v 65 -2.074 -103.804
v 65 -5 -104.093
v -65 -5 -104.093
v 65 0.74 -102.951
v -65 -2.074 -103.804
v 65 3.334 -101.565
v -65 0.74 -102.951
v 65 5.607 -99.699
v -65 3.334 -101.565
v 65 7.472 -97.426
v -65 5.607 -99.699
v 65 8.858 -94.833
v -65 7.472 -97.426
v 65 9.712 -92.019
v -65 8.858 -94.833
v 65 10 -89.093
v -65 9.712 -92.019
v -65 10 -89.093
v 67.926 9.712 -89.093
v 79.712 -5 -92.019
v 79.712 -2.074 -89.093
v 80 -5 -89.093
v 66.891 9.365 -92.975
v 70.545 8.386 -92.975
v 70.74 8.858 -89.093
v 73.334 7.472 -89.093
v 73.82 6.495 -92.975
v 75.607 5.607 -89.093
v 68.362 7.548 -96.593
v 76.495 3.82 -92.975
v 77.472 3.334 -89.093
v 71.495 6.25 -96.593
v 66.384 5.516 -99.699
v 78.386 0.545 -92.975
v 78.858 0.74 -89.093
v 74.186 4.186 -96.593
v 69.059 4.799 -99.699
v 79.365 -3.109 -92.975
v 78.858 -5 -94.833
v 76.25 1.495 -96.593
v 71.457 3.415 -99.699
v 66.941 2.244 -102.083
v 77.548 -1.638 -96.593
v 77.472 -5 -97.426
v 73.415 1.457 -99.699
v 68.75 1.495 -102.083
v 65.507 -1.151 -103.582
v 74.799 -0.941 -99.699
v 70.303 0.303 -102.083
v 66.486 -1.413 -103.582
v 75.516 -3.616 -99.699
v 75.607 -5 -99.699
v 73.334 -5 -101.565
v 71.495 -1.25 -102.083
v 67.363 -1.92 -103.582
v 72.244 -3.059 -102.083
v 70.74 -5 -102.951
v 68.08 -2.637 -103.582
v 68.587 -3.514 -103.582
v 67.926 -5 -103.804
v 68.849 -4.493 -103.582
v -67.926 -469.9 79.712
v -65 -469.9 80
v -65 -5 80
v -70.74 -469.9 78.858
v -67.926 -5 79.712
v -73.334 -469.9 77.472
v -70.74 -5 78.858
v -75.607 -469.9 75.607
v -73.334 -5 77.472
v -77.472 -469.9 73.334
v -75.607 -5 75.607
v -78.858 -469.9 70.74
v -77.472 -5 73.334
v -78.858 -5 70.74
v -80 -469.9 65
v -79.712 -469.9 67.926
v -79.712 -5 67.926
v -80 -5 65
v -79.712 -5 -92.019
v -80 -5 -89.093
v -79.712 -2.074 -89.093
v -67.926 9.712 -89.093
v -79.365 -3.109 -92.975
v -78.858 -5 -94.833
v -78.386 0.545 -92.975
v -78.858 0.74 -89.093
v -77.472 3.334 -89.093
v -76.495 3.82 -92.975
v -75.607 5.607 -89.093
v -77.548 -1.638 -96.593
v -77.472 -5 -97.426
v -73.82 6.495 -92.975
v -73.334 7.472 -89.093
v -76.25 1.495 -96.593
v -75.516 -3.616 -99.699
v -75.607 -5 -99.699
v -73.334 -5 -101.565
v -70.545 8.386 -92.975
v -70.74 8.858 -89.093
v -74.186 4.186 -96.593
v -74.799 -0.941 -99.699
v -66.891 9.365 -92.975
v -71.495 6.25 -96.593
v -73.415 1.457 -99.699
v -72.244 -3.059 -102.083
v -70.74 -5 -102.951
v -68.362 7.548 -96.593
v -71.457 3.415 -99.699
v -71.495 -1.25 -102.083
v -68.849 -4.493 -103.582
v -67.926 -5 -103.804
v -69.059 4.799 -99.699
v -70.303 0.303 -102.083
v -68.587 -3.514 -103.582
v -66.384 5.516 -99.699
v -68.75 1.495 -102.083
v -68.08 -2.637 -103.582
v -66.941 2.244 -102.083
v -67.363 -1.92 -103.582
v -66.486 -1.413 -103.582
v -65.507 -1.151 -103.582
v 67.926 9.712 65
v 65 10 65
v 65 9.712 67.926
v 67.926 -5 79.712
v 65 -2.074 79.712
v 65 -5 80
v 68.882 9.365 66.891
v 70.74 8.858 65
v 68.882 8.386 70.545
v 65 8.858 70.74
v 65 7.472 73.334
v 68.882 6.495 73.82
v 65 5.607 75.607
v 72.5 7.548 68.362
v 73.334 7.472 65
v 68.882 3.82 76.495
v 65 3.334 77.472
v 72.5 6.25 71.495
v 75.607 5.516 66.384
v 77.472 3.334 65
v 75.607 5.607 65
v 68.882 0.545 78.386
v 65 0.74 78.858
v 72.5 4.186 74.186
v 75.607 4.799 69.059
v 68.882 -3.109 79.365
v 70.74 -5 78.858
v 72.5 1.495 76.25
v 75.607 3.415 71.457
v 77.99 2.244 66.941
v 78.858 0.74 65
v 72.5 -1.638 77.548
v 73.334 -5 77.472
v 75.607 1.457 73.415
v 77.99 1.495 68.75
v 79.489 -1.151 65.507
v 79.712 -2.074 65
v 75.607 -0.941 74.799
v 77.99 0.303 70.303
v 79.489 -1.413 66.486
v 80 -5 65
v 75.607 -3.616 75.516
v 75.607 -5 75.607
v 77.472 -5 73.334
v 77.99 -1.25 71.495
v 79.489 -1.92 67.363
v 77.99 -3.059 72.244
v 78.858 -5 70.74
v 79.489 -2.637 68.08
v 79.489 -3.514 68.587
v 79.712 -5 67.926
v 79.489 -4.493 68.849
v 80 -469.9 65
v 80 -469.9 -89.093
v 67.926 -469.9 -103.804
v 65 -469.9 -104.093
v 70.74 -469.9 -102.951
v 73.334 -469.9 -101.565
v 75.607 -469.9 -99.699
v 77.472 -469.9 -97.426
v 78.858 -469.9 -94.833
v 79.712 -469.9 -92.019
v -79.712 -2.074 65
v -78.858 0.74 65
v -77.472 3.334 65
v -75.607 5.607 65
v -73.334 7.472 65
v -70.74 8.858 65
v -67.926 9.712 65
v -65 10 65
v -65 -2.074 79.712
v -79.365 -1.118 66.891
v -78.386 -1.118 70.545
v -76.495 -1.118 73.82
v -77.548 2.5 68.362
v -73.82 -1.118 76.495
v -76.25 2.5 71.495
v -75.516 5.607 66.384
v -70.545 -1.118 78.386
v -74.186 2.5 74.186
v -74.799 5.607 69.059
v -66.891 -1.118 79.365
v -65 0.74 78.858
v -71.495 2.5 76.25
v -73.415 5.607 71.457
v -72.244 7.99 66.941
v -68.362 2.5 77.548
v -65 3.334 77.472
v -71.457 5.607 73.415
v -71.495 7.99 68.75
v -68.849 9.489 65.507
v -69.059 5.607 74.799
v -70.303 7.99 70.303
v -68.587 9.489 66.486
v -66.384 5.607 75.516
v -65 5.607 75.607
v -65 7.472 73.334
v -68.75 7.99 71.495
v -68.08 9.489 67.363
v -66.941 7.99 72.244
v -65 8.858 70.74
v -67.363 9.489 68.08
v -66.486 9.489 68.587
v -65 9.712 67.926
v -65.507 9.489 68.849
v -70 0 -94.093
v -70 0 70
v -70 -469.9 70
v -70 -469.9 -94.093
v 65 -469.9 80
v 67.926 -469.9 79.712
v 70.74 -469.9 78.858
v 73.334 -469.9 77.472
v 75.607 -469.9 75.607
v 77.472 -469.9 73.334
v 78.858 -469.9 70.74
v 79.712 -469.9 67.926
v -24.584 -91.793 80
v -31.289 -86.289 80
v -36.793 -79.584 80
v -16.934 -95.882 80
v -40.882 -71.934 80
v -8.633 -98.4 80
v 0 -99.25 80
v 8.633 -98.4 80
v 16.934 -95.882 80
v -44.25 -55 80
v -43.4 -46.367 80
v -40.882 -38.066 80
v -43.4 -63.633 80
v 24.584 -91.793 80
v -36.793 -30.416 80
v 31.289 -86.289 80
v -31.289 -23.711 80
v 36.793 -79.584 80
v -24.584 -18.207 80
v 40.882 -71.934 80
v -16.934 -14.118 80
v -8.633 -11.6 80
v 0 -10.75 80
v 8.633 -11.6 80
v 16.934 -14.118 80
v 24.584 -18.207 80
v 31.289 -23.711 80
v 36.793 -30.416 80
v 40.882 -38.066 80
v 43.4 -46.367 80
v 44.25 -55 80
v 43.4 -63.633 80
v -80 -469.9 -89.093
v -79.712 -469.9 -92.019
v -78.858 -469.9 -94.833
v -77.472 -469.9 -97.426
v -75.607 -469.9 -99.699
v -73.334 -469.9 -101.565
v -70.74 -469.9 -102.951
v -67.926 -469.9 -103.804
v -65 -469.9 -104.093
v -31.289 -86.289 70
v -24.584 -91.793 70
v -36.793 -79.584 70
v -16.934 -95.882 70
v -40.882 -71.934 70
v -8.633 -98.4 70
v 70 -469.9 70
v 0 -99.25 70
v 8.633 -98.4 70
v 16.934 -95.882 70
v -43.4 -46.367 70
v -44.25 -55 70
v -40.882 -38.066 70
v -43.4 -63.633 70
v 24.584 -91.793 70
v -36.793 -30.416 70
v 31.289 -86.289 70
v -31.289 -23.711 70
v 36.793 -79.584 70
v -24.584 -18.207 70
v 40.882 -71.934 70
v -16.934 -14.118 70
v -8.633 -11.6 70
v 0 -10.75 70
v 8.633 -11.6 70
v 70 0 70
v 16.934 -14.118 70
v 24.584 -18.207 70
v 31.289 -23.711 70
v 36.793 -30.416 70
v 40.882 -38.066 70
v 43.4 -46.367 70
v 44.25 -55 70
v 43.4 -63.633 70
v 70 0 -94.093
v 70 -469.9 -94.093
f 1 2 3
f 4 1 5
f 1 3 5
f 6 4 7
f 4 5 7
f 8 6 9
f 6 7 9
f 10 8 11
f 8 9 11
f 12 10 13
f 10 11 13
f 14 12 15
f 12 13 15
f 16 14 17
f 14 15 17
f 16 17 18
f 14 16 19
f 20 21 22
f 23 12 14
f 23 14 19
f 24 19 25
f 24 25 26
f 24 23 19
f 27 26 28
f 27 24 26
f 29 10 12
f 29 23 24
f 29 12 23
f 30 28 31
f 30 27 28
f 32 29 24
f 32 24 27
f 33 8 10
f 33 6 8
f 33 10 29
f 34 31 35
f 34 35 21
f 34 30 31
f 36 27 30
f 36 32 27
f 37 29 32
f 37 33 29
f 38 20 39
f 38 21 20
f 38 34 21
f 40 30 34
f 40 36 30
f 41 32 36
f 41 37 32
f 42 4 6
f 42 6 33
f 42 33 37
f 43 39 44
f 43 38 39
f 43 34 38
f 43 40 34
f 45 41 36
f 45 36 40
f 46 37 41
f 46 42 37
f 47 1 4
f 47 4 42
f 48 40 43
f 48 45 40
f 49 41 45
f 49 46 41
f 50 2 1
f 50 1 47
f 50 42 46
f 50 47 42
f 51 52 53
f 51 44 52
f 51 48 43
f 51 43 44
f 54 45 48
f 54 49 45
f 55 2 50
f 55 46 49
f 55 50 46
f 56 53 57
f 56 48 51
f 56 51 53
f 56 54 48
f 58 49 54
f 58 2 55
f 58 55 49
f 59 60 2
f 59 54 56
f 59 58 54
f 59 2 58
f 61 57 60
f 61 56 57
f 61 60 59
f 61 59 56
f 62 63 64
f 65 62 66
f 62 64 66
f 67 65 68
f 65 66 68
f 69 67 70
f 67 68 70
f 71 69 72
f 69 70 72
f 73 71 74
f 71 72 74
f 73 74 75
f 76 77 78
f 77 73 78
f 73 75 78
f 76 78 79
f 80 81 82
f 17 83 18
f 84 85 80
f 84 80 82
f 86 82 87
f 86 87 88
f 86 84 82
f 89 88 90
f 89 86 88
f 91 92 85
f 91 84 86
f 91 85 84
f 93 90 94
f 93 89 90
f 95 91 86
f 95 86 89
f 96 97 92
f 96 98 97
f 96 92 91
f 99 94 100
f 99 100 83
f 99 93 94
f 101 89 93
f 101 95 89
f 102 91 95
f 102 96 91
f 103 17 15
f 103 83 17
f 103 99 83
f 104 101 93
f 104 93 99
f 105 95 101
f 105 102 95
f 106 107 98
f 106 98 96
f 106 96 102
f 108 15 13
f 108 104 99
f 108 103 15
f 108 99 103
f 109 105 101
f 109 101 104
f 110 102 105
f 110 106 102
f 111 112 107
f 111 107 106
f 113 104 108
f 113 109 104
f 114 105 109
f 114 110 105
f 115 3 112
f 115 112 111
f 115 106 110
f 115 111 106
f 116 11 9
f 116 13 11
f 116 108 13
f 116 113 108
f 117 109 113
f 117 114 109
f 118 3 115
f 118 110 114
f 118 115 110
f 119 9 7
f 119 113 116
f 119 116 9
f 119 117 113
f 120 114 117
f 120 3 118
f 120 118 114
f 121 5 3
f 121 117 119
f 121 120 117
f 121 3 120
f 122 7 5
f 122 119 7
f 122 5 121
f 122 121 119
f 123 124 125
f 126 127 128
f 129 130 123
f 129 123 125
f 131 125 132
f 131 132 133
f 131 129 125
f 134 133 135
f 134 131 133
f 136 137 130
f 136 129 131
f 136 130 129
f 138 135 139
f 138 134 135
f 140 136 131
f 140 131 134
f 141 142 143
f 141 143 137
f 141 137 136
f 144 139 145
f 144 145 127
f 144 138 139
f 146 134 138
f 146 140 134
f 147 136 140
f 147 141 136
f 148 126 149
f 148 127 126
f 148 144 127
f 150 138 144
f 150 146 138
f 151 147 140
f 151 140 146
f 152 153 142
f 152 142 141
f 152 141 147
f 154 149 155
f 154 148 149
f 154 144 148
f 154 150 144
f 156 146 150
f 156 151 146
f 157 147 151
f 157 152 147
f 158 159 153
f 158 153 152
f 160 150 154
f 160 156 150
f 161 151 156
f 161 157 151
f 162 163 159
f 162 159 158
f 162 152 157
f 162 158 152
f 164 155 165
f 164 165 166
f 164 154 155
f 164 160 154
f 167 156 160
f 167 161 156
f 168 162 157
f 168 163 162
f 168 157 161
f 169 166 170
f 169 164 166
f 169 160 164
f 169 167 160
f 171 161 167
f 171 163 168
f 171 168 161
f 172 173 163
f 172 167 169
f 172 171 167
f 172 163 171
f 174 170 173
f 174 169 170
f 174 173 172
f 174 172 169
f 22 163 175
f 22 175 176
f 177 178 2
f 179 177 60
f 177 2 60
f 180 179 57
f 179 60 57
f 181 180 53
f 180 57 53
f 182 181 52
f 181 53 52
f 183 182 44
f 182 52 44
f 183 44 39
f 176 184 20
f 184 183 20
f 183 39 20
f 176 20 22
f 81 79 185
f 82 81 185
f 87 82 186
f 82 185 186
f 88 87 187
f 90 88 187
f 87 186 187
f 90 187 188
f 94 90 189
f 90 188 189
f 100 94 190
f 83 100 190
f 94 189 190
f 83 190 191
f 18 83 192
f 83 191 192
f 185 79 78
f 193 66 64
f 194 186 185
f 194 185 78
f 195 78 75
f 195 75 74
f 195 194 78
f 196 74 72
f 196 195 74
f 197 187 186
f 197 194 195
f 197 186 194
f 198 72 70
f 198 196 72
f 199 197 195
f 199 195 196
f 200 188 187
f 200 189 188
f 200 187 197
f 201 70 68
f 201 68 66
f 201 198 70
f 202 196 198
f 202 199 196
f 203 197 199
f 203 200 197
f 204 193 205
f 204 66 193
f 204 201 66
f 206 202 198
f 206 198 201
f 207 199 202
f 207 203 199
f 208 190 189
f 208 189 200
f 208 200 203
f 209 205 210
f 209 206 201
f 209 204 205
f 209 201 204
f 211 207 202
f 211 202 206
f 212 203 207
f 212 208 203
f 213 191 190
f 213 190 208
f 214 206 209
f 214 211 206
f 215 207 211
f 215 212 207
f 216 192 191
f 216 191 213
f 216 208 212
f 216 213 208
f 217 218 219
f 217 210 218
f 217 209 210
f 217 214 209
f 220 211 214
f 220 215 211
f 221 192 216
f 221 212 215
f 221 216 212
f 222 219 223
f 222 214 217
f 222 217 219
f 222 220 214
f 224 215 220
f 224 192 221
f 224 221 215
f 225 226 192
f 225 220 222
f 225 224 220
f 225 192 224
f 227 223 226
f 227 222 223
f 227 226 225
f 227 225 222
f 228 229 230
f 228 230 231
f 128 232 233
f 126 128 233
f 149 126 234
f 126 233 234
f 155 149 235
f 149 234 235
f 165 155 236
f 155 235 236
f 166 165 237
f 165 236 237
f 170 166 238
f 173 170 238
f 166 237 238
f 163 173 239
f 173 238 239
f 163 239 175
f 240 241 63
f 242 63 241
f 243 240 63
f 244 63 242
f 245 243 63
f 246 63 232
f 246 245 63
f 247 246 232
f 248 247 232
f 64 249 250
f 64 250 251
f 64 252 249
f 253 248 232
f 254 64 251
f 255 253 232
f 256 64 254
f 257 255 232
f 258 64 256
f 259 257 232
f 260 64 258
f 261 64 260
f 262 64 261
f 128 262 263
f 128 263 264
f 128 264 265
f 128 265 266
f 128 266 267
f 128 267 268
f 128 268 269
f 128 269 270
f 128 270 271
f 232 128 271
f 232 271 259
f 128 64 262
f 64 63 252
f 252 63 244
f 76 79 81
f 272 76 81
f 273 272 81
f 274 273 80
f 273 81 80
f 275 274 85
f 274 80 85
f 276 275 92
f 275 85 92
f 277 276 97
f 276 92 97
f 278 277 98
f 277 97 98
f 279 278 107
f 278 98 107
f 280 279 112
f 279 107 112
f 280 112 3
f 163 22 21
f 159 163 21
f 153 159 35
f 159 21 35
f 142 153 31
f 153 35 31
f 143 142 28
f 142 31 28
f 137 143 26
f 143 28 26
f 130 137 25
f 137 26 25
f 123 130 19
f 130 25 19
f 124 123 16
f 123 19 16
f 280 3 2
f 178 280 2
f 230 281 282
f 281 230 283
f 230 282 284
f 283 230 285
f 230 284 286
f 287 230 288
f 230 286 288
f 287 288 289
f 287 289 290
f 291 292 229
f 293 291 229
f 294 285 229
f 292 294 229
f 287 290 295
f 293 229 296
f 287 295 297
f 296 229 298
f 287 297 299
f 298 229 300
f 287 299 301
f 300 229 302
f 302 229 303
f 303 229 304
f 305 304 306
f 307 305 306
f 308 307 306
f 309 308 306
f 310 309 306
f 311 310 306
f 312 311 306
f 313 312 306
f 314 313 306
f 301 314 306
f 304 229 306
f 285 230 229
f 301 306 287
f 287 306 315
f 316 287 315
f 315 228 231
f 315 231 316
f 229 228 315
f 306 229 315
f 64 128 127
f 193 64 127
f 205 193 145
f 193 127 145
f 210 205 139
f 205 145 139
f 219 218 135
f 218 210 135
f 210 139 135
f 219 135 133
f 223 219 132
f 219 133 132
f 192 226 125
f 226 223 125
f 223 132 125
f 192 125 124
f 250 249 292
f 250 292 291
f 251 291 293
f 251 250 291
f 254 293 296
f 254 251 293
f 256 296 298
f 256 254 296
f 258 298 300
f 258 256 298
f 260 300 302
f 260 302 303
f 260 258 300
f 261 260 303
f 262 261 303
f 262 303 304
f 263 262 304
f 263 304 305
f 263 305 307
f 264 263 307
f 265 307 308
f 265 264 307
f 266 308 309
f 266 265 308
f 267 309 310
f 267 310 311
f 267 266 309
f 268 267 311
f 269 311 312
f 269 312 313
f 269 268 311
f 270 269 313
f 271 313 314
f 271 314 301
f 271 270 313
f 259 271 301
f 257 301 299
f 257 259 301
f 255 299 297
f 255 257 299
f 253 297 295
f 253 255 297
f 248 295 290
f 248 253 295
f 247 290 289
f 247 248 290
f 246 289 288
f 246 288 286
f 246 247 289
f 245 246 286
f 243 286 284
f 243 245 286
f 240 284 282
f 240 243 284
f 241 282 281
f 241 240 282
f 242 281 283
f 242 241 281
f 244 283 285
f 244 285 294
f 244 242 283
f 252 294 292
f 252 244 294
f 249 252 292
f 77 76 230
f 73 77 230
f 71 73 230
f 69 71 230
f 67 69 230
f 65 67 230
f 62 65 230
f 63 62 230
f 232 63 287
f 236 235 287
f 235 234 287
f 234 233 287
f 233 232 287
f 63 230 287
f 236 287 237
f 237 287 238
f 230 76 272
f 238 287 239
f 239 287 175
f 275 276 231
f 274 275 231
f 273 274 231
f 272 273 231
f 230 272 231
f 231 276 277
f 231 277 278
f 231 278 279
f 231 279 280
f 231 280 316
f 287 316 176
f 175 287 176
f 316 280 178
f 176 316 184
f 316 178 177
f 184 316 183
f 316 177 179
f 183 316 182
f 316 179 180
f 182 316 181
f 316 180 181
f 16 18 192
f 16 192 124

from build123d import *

# Parameters (mm, degrees)
SKETCH2_W           = 140
SKETCH2_H           = 164.092615239
BOSS_EXTRUDE1_DEPTH = 469.9
SHELL1_T            = 10
FILLET2_R           = 15
SKETCH4_R           = 44.25
CUT_EXTRUDE2_DEPTH  = 10


with BuildPart() as part:
    # Sketch2 → Boss-Extrude1 (new body)
    with BuildSketch(Plane(origin=(0, 0, 0), x_dir=(1, 0, 0), z_dir=(0, 1, 0))):
        with Locations((0, 12.04630762)):
            Rectangle(SKETCH2_W, SKETCH2_H)
    extrude(amount=-BOSS_EXTRUDE1_DEPTH)

    # Shell1
    shell1_openings = [part.faces().sort_by_distance(p)[0] for p in [
        (0, -469.9, -12.046307619),
    ]]
    offset(amount=SHELL1_T, openings=shell1_openings, kind=Kind.INTERSECTION)

    # Fillet2
    # the kernel refuses this fillet: 15 mm, written as the material it takes off along each edge
    with BuildSketch(Plane(origin=(65, -5, 65), x_dir=(0, 1, 0), z_dir=(1, 0, 0))) as fillet2_piece_1_section:
        Polygon((0, 0), (FILLET2_R, 0), (FILLET2_R, FILLET2_R), (0, FILLET2_R), align=None)
    fillet2_piece_1 = extrude(amount=FILLET2_R, mode=Mode.PRIVATE)
    fillet2_piece_1 = fillet2_piece_1 - Plane(origin=(65, -5, 65), x_dir=(0, -0.7071067811865475, -0.7071067811865475), z_dir=(1, 0, 0)) * Sphere(FILLET2_R, mode=Mode.PRIVATE)
    add(fillet2_piece_1, mode=Mode.SUBTRACT)
    with BuildSketch(Plane(origin=(-65, -5, 65), x_dir=(0, 0, 1), z_dir=(0, 1, 0))) as fillet2_piece_2_section:
        Polygon((0, 0), (FILLET2_R, 0), (FILLET2_R, -FILLET2_R), (0, -FILLET2_R), align=None)
    fillet2_piece_2 = extrude(amount=FILLET2_R, mode=Mode.PRIVATE)
    fillet2_piece_2 = fillet2_piece_2 - Plane(origin=(-65, -5, 65), x_dir=(0.7071067811865475, 0, -0.7071067811865475), z_dir=(0, 1, 0)) * Sphere(FILLET2_R, mode=Mode.PRIVATE)
    add(fillet2_piece_2, mode=Mode.SUBTRACT)
    with BuildSketch(Plane(origin=(-65, -5, -89.092615239), x_dir=(0, 1, 0), z_dir=(0, 0, -1))) as fillet2_piece_3_section:
        Polygon((0, 0), (FILLET2_R, 0), (FILLET2_R, -FILLET2_R), (0, -FILLET2_R), align=None)
    fillet2_piece_3 = extrude(amount=FILLET2_R, mode=Mode.PRIVATE)
    fillet2_piece_3 = fillet2_piece_3 - Plane(origin=(-65, -5, -89.092615239), x_dir=(0.7071067811865475, -0.7071067811865475, 0), z_dir=(0, 0, -1)) * Sphere(FILLET2_R, mode=Mode.PRIVATE)
    add(fillet2_piece_3, mode=Mode.SUBTRACT)
    with BuildSketch(Plane(origin=(65, -5, -89.092615239), x_dir=(1, 0, 0), z_dir=(0, 0, -1))) as fillet2_piece_4_section:
        Polygon((0, 0), (FILLET2_R, 0), (FILLET2_R, -FILLET2_R), (0, -FILLET2_R), align=None)
    fillet2_piece_4 = extrude(amount=FILLET2_R, mode=Mode.PRIVATE)
    fillet2_piece_4 = fillet2_piece_4 - Plane(origin=(65, -5, -89.092615239), x_dir=(-0.7071067811865475, -0.7071067811865475, 0), z_dir=(0, 0, -1)) * Sphere(FILLET2_R, mode=Mode.PRIVATE)
    add(fillet2_piece_4, mode=Mode.SUBTRACT)
    with BuildSketch(Plane(origin=(65, 10, 80), x_dir=(0, -1, 0), z_dir=(-1, 0, 0)), Plane(origin=(-65, 10, -104.092615239), x_dir=(0, -1, 0), z_dir=(1, 0, 0))) as fillet2_piece_5:
        with BuildLine():
            CenterArc((FILLET2_R, -FILLET2_R), FILLET2_R, 90, 90)
            Line((0, -FILLET2_R), (0, 0))
            Line((0, 0), (FILLET2_R, 0))
        make_face()
    extrude(amount=130, mode=Mode.SUBTRACT)
    with BuildSketch(Plane(origin=(-80, 10, 65), x_dir=(0, -1, 0), z_dir=(0, 0, -1)), Plane(origin=(80, 10, -89.092615239), x_dir=(0, -1, 0), z_dir=(0, 0, 1))) as fillet2_piece_6:
        with BuildLine():
            CenterArc((FILLET2_R, -FILLET2_R), FILLET2_R, 90, 90)
            Line((0, -FILLET2_R), (0, 0))
            Line((0, 0), (FILLET2_R, 0))
        make_face()
    extrude(amount=154.092615239, mode=Mode.SUBTRACT)
    with BuildSketch(Plane(origin=(80, -507.4, 80), x_dir=(-1, 0, 0), z_dir=(0, 1, 0)), Plane(origin=(-80, -5, 80), x_dir=(1, 0, 0), z_dir=(0, -1, 0)), Plane(origin=(-80, -5, -104.092615239), x_dir=(0, 0, 1), z_dir=(0, -1, 0)), Plane(origin=(80, -5, -104.092615239), x_dir=(-1, 0, 0), z_dir=(0, -1, 0))) as fillet2_piece_7:
        with BuildLine():
            CenterArc((FILLET2_R, -FILLET2_R), FILLET2_R, 90, 90)
            Line((0, -FILLET2_R), (0, 0))
            Line((0, 0), (FILLET2_R, 0))
        make_face()
    extrude(amount=502.4, mode=Mode.SUBTRACT)

    # Sketch4 → Cut-Extrude2 (cut)
    with BuildSketch(Plane(origin=(44.675144213, 0, 80), x_dir=(-1, 0, 0), z_dir=(0, 0, -1))):
        with Locations((44.675144213, -55)):
            Circle(SKETCH4_R)
    extrude(amount=CUT_EXTRUDE2_DEPTH, mode=Mode.SUBTRACT)


solid = part.part
